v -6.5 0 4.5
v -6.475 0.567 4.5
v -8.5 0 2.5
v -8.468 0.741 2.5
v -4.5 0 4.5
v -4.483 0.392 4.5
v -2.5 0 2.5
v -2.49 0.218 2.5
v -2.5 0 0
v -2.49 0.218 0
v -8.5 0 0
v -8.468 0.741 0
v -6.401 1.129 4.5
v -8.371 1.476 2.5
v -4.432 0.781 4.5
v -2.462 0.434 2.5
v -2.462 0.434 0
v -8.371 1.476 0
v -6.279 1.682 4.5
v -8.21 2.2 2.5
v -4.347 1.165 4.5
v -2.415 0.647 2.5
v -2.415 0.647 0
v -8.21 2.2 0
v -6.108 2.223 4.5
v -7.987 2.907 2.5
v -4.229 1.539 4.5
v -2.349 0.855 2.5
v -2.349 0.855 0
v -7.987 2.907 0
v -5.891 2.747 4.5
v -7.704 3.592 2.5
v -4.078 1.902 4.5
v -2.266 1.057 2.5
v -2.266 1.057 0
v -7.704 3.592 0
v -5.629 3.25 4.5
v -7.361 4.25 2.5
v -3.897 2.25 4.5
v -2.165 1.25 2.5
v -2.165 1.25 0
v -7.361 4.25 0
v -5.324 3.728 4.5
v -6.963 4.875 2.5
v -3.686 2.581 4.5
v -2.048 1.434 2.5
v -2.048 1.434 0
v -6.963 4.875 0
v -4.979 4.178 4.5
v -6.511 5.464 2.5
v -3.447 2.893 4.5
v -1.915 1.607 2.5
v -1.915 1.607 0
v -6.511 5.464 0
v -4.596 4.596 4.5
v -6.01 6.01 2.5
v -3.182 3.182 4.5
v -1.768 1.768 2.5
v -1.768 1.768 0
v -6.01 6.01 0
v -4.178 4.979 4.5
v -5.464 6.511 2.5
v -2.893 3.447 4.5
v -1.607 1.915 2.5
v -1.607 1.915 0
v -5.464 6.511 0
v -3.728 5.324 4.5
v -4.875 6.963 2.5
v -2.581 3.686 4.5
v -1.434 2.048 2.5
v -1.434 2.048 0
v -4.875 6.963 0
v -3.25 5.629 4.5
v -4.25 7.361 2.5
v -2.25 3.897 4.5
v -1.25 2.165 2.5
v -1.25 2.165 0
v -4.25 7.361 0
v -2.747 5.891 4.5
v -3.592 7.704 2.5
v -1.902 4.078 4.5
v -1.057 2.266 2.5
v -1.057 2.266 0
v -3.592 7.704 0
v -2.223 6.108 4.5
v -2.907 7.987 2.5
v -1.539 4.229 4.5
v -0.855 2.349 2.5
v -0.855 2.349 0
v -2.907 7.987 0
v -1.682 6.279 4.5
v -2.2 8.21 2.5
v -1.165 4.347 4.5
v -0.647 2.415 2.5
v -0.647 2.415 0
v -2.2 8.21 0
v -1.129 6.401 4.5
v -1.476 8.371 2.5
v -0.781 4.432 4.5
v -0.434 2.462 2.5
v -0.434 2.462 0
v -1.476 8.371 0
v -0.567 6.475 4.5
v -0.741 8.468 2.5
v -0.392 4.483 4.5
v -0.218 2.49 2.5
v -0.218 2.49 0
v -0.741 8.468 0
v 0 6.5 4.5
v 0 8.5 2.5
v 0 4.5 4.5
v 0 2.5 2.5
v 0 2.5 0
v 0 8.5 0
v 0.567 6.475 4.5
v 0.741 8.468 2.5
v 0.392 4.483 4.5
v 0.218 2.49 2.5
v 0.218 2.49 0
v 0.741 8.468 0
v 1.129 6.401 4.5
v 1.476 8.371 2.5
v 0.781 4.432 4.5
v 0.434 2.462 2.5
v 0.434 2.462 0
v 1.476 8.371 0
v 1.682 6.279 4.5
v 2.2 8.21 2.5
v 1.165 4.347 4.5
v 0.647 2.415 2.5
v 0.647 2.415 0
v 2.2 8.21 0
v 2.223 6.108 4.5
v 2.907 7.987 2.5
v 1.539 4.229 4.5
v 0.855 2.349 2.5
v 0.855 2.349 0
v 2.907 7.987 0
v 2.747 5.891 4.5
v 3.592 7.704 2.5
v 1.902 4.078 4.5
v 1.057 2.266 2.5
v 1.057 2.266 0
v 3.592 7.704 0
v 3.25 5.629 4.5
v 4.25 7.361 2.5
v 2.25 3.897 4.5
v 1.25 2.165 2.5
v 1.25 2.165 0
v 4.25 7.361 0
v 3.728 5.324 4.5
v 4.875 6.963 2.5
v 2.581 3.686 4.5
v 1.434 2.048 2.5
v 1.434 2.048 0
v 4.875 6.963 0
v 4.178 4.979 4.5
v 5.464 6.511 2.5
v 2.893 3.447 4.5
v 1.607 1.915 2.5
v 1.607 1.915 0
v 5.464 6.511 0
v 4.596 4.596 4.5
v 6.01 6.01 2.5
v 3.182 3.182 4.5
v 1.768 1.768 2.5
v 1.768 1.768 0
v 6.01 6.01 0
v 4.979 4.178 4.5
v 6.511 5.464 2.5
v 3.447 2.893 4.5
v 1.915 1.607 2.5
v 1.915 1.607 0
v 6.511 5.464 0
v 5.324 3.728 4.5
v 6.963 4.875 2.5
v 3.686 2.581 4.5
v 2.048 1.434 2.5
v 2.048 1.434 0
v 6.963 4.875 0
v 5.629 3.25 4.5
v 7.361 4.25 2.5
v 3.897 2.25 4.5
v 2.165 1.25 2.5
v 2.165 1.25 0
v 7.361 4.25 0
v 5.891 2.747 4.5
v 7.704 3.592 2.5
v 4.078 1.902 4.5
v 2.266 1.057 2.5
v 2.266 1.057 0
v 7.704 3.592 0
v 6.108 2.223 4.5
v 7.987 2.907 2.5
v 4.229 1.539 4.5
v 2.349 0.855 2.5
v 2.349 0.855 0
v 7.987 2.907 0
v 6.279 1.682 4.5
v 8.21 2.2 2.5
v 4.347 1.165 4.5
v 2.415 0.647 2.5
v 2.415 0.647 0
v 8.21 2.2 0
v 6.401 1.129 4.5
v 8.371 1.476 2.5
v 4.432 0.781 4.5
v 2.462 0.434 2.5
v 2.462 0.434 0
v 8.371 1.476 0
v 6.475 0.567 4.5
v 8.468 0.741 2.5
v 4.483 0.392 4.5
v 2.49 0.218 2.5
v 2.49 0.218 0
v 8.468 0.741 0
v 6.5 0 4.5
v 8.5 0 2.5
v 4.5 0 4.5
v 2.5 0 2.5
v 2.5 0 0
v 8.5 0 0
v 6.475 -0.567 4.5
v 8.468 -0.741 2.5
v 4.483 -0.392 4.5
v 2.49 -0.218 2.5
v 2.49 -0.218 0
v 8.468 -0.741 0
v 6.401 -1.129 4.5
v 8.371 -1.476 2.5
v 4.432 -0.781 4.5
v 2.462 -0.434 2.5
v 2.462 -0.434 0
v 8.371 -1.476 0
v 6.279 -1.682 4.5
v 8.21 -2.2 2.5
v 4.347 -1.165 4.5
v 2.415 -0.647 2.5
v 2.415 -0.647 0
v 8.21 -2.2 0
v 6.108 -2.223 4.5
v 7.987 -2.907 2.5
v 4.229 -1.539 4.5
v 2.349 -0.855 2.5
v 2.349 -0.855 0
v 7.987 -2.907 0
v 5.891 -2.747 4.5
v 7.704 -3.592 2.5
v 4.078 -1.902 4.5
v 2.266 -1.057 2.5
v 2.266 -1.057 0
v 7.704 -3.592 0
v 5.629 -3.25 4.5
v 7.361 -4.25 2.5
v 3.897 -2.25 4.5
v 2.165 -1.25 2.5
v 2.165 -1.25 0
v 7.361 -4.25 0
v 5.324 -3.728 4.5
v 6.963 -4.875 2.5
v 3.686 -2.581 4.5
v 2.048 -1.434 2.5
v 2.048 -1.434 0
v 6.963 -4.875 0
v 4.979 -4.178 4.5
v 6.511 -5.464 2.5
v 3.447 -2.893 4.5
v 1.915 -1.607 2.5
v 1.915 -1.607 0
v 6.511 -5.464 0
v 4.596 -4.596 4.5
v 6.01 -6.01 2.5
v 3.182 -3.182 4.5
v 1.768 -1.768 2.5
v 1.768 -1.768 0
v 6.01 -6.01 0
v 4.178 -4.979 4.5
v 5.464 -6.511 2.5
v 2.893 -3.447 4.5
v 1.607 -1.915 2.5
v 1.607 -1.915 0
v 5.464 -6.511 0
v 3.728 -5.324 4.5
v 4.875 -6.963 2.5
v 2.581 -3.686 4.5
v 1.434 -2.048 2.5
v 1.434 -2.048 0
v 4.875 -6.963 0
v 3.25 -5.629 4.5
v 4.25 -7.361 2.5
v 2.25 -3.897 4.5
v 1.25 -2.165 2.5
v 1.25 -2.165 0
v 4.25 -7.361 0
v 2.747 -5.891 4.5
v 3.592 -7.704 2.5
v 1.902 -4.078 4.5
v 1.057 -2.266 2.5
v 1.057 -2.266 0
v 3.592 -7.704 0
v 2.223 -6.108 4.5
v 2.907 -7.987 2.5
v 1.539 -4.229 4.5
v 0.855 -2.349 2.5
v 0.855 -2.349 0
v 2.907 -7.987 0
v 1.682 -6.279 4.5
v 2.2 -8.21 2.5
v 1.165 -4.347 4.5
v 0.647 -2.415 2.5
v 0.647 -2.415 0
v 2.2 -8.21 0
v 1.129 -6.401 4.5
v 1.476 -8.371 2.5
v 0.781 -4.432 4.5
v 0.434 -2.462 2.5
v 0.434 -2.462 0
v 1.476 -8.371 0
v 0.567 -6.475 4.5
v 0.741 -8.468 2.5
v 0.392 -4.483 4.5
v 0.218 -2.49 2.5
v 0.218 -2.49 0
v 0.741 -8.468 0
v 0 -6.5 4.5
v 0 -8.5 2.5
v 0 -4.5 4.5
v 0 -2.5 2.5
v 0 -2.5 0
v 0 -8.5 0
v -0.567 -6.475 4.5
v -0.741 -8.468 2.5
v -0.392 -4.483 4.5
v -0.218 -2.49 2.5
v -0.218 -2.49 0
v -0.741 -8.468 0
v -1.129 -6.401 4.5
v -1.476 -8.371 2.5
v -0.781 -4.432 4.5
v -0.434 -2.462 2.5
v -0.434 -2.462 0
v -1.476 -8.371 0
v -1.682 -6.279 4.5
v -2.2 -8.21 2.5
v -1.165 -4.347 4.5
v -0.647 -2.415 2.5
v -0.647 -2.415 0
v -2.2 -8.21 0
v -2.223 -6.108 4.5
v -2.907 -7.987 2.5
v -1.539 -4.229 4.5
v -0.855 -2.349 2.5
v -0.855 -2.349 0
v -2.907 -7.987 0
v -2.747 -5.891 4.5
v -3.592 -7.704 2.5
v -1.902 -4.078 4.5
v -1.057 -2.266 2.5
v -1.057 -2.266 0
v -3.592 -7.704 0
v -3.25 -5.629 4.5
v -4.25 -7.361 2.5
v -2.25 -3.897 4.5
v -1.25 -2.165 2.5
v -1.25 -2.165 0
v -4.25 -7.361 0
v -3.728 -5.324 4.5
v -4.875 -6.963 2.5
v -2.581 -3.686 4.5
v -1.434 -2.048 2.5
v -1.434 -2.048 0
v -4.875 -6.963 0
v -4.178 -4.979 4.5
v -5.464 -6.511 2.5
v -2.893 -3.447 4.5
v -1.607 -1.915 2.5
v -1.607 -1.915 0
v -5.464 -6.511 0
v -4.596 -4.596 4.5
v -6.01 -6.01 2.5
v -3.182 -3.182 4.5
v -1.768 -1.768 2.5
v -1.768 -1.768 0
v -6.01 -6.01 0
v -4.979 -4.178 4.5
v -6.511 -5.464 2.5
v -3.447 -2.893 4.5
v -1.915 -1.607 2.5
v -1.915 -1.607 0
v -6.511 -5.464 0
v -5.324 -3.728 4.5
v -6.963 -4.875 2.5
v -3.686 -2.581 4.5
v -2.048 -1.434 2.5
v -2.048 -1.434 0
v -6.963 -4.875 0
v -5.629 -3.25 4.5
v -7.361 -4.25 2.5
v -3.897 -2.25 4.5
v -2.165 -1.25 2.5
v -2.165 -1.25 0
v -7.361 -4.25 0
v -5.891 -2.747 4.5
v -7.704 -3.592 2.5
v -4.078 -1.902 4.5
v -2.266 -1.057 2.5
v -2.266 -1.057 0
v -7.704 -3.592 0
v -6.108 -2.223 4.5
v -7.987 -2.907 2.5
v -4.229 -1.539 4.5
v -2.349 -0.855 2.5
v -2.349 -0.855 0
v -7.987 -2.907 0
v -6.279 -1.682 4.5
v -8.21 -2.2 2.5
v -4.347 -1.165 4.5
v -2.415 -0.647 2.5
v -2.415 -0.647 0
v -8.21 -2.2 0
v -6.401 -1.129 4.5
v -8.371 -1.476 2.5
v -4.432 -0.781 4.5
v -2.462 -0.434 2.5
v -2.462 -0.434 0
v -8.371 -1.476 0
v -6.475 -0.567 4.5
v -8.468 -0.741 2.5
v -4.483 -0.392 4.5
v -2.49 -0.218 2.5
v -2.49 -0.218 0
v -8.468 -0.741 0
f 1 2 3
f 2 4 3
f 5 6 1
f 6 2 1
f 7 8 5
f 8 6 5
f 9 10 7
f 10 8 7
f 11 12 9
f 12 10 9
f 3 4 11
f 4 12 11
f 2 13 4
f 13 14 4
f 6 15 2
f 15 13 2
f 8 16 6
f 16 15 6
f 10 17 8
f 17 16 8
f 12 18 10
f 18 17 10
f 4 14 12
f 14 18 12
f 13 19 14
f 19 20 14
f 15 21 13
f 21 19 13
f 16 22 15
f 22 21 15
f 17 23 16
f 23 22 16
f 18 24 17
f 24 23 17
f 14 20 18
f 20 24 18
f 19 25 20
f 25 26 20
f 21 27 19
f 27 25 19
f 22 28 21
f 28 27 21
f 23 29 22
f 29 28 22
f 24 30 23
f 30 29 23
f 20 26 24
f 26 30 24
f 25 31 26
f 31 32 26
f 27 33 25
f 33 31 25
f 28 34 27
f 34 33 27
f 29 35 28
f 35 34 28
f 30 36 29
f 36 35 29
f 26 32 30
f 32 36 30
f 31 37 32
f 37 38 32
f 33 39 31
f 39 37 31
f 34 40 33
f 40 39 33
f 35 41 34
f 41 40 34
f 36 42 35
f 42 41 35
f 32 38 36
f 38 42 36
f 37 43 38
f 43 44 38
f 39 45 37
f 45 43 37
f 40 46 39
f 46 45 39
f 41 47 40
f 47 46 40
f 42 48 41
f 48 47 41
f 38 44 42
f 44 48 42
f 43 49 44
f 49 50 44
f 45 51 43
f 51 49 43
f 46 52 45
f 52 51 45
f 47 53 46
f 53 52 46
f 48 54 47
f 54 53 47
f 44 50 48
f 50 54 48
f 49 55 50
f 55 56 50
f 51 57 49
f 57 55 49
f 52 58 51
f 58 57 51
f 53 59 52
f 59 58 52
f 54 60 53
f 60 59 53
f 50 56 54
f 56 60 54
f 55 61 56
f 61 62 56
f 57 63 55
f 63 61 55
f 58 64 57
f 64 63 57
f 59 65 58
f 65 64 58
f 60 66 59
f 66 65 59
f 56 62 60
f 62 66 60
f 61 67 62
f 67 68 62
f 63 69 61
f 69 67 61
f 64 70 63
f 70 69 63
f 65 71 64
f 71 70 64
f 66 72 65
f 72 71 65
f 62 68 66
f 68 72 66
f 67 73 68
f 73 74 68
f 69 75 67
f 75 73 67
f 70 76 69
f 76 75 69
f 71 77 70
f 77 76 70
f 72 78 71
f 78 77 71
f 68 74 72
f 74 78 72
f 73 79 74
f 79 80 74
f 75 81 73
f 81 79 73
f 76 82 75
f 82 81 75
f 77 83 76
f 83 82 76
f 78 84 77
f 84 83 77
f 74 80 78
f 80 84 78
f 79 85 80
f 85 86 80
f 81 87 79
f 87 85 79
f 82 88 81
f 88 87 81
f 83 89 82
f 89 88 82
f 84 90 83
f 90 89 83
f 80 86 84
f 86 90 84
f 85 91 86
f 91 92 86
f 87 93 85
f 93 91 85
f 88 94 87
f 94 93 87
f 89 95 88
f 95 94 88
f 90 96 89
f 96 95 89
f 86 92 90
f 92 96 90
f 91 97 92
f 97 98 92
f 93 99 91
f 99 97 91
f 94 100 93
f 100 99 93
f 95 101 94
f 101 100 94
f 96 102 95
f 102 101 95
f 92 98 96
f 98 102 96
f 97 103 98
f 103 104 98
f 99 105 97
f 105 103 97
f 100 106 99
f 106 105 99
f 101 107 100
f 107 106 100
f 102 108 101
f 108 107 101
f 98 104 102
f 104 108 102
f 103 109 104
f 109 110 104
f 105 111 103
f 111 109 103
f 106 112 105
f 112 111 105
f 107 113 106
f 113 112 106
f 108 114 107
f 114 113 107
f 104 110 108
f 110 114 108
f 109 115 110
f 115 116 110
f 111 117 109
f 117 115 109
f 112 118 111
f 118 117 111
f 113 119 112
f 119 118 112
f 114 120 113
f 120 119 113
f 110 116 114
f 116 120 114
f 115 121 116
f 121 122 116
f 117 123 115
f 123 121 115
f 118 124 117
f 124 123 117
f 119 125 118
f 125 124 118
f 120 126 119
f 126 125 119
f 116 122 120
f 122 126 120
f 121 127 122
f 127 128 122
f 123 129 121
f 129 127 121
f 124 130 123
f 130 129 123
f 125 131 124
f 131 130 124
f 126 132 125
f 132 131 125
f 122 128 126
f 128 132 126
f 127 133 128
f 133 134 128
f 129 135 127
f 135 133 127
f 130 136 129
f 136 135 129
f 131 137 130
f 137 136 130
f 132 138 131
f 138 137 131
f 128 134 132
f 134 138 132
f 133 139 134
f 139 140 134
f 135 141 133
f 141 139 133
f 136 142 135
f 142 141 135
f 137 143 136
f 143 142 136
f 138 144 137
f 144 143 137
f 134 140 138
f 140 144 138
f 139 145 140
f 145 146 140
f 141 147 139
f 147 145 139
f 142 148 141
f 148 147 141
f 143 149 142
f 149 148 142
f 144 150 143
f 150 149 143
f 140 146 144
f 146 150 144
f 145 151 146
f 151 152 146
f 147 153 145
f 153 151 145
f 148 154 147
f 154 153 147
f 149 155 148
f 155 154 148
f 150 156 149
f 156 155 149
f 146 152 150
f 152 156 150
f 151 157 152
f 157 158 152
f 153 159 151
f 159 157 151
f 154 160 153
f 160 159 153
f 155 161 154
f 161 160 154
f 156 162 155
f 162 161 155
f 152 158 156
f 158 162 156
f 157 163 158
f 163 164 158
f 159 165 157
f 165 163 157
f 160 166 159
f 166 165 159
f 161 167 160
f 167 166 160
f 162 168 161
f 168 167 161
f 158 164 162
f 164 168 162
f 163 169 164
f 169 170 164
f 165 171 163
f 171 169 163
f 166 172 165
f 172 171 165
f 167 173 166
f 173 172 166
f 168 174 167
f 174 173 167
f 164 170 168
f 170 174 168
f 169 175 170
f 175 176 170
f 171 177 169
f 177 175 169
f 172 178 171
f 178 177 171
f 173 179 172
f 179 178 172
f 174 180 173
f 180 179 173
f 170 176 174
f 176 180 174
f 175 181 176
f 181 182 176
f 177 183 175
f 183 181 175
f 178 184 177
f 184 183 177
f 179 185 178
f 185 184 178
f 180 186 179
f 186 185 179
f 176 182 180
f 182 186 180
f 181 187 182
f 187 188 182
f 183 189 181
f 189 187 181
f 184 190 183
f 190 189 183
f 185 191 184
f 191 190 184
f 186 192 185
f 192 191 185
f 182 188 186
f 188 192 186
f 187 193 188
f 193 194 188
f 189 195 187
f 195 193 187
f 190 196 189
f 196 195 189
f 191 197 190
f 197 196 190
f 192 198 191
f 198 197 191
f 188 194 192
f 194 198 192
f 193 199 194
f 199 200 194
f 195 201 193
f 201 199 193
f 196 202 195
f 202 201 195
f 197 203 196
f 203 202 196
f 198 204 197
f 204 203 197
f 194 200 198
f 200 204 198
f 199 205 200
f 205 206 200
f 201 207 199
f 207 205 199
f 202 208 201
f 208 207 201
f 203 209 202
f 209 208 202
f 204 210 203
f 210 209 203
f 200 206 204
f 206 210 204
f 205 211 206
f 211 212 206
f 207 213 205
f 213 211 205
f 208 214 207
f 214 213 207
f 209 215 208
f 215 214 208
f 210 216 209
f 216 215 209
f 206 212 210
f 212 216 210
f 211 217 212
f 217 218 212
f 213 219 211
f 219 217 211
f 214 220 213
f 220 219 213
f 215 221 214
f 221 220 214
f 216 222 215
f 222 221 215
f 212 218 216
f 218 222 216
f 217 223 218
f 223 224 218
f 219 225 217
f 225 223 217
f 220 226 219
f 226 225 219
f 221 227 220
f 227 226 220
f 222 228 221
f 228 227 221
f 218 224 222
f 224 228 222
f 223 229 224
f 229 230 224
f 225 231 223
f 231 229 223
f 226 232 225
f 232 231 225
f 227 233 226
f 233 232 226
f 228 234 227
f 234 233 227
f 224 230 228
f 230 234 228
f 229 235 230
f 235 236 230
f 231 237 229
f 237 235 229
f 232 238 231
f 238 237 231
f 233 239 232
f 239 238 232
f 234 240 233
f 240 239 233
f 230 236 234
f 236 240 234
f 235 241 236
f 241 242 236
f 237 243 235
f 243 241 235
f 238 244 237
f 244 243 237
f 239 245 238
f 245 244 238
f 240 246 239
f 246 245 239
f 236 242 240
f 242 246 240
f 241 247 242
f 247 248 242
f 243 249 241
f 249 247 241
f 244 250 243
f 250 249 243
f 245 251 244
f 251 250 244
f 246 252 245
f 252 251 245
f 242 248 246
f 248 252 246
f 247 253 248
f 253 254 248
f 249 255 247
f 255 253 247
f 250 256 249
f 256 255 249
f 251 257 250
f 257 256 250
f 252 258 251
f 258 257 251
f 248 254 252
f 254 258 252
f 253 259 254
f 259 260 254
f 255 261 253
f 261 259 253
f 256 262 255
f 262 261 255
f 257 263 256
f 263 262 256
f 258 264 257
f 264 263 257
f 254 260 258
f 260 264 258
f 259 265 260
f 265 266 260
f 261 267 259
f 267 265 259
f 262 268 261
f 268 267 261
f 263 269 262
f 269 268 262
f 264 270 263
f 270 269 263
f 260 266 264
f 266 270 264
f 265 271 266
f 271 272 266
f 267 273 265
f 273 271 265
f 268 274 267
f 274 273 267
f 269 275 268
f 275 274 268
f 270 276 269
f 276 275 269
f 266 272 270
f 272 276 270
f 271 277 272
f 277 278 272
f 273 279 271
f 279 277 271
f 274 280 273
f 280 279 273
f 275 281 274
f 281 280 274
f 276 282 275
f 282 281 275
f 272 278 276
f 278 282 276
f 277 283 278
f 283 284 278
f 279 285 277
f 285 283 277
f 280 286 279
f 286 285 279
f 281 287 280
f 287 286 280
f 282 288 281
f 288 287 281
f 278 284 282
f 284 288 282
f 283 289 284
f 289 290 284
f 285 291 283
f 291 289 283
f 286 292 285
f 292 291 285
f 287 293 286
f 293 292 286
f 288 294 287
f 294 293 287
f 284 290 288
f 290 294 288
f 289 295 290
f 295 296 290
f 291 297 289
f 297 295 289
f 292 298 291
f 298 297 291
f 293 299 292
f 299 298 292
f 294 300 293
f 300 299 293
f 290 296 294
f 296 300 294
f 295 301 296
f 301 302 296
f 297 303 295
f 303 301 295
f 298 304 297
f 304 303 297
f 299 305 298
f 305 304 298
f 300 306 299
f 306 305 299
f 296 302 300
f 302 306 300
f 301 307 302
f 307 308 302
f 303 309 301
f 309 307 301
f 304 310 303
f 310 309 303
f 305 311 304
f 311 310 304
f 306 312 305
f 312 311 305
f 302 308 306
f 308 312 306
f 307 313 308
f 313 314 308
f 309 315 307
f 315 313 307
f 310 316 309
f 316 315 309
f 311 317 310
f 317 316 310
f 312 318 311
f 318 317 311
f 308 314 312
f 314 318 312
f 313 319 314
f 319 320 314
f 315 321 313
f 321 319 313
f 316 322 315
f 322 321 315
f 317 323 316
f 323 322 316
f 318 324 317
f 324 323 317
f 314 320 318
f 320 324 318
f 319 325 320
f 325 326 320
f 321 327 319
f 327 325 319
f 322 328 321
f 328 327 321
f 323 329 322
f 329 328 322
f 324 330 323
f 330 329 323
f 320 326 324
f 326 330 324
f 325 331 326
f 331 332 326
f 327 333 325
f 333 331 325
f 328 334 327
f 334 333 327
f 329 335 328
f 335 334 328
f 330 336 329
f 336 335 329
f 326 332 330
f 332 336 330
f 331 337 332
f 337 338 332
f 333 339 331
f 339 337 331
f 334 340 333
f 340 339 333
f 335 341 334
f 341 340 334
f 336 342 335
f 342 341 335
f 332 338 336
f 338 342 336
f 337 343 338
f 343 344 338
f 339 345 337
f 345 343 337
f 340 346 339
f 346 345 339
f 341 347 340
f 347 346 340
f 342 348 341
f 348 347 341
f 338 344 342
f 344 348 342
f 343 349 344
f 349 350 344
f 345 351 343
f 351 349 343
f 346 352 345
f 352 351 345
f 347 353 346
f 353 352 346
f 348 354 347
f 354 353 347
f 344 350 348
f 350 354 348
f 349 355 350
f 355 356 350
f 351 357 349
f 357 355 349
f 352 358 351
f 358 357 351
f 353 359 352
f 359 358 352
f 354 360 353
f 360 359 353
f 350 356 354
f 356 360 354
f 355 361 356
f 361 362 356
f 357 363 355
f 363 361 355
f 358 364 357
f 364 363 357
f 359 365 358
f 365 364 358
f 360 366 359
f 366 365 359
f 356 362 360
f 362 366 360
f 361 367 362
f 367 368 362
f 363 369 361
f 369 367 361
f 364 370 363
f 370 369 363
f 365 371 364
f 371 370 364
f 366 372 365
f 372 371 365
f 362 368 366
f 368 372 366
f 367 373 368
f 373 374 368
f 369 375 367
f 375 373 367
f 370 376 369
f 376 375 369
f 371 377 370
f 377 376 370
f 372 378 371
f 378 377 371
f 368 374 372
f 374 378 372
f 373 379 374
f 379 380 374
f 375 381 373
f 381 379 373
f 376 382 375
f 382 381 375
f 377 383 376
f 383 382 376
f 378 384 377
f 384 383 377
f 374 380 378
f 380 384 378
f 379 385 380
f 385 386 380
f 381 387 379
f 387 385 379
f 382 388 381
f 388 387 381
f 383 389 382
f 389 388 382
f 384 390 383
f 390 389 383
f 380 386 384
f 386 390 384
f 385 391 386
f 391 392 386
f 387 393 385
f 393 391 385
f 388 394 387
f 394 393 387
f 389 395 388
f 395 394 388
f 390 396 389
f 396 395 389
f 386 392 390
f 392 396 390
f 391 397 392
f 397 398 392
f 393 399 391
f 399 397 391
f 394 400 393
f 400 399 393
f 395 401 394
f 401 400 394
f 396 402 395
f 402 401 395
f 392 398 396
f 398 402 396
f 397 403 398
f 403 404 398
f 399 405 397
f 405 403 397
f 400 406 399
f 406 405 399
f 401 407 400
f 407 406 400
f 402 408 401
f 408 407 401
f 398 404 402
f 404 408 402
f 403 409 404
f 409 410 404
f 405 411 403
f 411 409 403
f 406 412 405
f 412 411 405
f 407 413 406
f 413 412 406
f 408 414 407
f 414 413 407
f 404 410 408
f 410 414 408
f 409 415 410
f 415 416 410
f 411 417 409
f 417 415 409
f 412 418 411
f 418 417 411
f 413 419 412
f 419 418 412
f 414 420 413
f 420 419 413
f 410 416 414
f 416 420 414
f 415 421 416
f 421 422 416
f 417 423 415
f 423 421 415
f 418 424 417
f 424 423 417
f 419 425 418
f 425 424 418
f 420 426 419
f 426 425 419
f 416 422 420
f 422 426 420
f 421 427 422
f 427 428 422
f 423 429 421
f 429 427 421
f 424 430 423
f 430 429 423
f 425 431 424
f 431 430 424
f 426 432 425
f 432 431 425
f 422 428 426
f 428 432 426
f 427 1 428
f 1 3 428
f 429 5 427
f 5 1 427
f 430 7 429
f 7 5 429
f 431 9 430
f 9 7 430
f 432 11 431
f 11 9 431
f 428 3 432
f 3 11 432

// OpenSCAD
// FinishingWasher-v1.0

// [r, z]
profile = [
	[2.5, 0  ],
	[2.5, 2.5],
	[4.5, 4.5],
	[6.5, 4.5],
	[8.5, 2.5],
	[8.5, 0  ]
];

rotate_extrude($fn=72) {
	polygon(profile);
}
